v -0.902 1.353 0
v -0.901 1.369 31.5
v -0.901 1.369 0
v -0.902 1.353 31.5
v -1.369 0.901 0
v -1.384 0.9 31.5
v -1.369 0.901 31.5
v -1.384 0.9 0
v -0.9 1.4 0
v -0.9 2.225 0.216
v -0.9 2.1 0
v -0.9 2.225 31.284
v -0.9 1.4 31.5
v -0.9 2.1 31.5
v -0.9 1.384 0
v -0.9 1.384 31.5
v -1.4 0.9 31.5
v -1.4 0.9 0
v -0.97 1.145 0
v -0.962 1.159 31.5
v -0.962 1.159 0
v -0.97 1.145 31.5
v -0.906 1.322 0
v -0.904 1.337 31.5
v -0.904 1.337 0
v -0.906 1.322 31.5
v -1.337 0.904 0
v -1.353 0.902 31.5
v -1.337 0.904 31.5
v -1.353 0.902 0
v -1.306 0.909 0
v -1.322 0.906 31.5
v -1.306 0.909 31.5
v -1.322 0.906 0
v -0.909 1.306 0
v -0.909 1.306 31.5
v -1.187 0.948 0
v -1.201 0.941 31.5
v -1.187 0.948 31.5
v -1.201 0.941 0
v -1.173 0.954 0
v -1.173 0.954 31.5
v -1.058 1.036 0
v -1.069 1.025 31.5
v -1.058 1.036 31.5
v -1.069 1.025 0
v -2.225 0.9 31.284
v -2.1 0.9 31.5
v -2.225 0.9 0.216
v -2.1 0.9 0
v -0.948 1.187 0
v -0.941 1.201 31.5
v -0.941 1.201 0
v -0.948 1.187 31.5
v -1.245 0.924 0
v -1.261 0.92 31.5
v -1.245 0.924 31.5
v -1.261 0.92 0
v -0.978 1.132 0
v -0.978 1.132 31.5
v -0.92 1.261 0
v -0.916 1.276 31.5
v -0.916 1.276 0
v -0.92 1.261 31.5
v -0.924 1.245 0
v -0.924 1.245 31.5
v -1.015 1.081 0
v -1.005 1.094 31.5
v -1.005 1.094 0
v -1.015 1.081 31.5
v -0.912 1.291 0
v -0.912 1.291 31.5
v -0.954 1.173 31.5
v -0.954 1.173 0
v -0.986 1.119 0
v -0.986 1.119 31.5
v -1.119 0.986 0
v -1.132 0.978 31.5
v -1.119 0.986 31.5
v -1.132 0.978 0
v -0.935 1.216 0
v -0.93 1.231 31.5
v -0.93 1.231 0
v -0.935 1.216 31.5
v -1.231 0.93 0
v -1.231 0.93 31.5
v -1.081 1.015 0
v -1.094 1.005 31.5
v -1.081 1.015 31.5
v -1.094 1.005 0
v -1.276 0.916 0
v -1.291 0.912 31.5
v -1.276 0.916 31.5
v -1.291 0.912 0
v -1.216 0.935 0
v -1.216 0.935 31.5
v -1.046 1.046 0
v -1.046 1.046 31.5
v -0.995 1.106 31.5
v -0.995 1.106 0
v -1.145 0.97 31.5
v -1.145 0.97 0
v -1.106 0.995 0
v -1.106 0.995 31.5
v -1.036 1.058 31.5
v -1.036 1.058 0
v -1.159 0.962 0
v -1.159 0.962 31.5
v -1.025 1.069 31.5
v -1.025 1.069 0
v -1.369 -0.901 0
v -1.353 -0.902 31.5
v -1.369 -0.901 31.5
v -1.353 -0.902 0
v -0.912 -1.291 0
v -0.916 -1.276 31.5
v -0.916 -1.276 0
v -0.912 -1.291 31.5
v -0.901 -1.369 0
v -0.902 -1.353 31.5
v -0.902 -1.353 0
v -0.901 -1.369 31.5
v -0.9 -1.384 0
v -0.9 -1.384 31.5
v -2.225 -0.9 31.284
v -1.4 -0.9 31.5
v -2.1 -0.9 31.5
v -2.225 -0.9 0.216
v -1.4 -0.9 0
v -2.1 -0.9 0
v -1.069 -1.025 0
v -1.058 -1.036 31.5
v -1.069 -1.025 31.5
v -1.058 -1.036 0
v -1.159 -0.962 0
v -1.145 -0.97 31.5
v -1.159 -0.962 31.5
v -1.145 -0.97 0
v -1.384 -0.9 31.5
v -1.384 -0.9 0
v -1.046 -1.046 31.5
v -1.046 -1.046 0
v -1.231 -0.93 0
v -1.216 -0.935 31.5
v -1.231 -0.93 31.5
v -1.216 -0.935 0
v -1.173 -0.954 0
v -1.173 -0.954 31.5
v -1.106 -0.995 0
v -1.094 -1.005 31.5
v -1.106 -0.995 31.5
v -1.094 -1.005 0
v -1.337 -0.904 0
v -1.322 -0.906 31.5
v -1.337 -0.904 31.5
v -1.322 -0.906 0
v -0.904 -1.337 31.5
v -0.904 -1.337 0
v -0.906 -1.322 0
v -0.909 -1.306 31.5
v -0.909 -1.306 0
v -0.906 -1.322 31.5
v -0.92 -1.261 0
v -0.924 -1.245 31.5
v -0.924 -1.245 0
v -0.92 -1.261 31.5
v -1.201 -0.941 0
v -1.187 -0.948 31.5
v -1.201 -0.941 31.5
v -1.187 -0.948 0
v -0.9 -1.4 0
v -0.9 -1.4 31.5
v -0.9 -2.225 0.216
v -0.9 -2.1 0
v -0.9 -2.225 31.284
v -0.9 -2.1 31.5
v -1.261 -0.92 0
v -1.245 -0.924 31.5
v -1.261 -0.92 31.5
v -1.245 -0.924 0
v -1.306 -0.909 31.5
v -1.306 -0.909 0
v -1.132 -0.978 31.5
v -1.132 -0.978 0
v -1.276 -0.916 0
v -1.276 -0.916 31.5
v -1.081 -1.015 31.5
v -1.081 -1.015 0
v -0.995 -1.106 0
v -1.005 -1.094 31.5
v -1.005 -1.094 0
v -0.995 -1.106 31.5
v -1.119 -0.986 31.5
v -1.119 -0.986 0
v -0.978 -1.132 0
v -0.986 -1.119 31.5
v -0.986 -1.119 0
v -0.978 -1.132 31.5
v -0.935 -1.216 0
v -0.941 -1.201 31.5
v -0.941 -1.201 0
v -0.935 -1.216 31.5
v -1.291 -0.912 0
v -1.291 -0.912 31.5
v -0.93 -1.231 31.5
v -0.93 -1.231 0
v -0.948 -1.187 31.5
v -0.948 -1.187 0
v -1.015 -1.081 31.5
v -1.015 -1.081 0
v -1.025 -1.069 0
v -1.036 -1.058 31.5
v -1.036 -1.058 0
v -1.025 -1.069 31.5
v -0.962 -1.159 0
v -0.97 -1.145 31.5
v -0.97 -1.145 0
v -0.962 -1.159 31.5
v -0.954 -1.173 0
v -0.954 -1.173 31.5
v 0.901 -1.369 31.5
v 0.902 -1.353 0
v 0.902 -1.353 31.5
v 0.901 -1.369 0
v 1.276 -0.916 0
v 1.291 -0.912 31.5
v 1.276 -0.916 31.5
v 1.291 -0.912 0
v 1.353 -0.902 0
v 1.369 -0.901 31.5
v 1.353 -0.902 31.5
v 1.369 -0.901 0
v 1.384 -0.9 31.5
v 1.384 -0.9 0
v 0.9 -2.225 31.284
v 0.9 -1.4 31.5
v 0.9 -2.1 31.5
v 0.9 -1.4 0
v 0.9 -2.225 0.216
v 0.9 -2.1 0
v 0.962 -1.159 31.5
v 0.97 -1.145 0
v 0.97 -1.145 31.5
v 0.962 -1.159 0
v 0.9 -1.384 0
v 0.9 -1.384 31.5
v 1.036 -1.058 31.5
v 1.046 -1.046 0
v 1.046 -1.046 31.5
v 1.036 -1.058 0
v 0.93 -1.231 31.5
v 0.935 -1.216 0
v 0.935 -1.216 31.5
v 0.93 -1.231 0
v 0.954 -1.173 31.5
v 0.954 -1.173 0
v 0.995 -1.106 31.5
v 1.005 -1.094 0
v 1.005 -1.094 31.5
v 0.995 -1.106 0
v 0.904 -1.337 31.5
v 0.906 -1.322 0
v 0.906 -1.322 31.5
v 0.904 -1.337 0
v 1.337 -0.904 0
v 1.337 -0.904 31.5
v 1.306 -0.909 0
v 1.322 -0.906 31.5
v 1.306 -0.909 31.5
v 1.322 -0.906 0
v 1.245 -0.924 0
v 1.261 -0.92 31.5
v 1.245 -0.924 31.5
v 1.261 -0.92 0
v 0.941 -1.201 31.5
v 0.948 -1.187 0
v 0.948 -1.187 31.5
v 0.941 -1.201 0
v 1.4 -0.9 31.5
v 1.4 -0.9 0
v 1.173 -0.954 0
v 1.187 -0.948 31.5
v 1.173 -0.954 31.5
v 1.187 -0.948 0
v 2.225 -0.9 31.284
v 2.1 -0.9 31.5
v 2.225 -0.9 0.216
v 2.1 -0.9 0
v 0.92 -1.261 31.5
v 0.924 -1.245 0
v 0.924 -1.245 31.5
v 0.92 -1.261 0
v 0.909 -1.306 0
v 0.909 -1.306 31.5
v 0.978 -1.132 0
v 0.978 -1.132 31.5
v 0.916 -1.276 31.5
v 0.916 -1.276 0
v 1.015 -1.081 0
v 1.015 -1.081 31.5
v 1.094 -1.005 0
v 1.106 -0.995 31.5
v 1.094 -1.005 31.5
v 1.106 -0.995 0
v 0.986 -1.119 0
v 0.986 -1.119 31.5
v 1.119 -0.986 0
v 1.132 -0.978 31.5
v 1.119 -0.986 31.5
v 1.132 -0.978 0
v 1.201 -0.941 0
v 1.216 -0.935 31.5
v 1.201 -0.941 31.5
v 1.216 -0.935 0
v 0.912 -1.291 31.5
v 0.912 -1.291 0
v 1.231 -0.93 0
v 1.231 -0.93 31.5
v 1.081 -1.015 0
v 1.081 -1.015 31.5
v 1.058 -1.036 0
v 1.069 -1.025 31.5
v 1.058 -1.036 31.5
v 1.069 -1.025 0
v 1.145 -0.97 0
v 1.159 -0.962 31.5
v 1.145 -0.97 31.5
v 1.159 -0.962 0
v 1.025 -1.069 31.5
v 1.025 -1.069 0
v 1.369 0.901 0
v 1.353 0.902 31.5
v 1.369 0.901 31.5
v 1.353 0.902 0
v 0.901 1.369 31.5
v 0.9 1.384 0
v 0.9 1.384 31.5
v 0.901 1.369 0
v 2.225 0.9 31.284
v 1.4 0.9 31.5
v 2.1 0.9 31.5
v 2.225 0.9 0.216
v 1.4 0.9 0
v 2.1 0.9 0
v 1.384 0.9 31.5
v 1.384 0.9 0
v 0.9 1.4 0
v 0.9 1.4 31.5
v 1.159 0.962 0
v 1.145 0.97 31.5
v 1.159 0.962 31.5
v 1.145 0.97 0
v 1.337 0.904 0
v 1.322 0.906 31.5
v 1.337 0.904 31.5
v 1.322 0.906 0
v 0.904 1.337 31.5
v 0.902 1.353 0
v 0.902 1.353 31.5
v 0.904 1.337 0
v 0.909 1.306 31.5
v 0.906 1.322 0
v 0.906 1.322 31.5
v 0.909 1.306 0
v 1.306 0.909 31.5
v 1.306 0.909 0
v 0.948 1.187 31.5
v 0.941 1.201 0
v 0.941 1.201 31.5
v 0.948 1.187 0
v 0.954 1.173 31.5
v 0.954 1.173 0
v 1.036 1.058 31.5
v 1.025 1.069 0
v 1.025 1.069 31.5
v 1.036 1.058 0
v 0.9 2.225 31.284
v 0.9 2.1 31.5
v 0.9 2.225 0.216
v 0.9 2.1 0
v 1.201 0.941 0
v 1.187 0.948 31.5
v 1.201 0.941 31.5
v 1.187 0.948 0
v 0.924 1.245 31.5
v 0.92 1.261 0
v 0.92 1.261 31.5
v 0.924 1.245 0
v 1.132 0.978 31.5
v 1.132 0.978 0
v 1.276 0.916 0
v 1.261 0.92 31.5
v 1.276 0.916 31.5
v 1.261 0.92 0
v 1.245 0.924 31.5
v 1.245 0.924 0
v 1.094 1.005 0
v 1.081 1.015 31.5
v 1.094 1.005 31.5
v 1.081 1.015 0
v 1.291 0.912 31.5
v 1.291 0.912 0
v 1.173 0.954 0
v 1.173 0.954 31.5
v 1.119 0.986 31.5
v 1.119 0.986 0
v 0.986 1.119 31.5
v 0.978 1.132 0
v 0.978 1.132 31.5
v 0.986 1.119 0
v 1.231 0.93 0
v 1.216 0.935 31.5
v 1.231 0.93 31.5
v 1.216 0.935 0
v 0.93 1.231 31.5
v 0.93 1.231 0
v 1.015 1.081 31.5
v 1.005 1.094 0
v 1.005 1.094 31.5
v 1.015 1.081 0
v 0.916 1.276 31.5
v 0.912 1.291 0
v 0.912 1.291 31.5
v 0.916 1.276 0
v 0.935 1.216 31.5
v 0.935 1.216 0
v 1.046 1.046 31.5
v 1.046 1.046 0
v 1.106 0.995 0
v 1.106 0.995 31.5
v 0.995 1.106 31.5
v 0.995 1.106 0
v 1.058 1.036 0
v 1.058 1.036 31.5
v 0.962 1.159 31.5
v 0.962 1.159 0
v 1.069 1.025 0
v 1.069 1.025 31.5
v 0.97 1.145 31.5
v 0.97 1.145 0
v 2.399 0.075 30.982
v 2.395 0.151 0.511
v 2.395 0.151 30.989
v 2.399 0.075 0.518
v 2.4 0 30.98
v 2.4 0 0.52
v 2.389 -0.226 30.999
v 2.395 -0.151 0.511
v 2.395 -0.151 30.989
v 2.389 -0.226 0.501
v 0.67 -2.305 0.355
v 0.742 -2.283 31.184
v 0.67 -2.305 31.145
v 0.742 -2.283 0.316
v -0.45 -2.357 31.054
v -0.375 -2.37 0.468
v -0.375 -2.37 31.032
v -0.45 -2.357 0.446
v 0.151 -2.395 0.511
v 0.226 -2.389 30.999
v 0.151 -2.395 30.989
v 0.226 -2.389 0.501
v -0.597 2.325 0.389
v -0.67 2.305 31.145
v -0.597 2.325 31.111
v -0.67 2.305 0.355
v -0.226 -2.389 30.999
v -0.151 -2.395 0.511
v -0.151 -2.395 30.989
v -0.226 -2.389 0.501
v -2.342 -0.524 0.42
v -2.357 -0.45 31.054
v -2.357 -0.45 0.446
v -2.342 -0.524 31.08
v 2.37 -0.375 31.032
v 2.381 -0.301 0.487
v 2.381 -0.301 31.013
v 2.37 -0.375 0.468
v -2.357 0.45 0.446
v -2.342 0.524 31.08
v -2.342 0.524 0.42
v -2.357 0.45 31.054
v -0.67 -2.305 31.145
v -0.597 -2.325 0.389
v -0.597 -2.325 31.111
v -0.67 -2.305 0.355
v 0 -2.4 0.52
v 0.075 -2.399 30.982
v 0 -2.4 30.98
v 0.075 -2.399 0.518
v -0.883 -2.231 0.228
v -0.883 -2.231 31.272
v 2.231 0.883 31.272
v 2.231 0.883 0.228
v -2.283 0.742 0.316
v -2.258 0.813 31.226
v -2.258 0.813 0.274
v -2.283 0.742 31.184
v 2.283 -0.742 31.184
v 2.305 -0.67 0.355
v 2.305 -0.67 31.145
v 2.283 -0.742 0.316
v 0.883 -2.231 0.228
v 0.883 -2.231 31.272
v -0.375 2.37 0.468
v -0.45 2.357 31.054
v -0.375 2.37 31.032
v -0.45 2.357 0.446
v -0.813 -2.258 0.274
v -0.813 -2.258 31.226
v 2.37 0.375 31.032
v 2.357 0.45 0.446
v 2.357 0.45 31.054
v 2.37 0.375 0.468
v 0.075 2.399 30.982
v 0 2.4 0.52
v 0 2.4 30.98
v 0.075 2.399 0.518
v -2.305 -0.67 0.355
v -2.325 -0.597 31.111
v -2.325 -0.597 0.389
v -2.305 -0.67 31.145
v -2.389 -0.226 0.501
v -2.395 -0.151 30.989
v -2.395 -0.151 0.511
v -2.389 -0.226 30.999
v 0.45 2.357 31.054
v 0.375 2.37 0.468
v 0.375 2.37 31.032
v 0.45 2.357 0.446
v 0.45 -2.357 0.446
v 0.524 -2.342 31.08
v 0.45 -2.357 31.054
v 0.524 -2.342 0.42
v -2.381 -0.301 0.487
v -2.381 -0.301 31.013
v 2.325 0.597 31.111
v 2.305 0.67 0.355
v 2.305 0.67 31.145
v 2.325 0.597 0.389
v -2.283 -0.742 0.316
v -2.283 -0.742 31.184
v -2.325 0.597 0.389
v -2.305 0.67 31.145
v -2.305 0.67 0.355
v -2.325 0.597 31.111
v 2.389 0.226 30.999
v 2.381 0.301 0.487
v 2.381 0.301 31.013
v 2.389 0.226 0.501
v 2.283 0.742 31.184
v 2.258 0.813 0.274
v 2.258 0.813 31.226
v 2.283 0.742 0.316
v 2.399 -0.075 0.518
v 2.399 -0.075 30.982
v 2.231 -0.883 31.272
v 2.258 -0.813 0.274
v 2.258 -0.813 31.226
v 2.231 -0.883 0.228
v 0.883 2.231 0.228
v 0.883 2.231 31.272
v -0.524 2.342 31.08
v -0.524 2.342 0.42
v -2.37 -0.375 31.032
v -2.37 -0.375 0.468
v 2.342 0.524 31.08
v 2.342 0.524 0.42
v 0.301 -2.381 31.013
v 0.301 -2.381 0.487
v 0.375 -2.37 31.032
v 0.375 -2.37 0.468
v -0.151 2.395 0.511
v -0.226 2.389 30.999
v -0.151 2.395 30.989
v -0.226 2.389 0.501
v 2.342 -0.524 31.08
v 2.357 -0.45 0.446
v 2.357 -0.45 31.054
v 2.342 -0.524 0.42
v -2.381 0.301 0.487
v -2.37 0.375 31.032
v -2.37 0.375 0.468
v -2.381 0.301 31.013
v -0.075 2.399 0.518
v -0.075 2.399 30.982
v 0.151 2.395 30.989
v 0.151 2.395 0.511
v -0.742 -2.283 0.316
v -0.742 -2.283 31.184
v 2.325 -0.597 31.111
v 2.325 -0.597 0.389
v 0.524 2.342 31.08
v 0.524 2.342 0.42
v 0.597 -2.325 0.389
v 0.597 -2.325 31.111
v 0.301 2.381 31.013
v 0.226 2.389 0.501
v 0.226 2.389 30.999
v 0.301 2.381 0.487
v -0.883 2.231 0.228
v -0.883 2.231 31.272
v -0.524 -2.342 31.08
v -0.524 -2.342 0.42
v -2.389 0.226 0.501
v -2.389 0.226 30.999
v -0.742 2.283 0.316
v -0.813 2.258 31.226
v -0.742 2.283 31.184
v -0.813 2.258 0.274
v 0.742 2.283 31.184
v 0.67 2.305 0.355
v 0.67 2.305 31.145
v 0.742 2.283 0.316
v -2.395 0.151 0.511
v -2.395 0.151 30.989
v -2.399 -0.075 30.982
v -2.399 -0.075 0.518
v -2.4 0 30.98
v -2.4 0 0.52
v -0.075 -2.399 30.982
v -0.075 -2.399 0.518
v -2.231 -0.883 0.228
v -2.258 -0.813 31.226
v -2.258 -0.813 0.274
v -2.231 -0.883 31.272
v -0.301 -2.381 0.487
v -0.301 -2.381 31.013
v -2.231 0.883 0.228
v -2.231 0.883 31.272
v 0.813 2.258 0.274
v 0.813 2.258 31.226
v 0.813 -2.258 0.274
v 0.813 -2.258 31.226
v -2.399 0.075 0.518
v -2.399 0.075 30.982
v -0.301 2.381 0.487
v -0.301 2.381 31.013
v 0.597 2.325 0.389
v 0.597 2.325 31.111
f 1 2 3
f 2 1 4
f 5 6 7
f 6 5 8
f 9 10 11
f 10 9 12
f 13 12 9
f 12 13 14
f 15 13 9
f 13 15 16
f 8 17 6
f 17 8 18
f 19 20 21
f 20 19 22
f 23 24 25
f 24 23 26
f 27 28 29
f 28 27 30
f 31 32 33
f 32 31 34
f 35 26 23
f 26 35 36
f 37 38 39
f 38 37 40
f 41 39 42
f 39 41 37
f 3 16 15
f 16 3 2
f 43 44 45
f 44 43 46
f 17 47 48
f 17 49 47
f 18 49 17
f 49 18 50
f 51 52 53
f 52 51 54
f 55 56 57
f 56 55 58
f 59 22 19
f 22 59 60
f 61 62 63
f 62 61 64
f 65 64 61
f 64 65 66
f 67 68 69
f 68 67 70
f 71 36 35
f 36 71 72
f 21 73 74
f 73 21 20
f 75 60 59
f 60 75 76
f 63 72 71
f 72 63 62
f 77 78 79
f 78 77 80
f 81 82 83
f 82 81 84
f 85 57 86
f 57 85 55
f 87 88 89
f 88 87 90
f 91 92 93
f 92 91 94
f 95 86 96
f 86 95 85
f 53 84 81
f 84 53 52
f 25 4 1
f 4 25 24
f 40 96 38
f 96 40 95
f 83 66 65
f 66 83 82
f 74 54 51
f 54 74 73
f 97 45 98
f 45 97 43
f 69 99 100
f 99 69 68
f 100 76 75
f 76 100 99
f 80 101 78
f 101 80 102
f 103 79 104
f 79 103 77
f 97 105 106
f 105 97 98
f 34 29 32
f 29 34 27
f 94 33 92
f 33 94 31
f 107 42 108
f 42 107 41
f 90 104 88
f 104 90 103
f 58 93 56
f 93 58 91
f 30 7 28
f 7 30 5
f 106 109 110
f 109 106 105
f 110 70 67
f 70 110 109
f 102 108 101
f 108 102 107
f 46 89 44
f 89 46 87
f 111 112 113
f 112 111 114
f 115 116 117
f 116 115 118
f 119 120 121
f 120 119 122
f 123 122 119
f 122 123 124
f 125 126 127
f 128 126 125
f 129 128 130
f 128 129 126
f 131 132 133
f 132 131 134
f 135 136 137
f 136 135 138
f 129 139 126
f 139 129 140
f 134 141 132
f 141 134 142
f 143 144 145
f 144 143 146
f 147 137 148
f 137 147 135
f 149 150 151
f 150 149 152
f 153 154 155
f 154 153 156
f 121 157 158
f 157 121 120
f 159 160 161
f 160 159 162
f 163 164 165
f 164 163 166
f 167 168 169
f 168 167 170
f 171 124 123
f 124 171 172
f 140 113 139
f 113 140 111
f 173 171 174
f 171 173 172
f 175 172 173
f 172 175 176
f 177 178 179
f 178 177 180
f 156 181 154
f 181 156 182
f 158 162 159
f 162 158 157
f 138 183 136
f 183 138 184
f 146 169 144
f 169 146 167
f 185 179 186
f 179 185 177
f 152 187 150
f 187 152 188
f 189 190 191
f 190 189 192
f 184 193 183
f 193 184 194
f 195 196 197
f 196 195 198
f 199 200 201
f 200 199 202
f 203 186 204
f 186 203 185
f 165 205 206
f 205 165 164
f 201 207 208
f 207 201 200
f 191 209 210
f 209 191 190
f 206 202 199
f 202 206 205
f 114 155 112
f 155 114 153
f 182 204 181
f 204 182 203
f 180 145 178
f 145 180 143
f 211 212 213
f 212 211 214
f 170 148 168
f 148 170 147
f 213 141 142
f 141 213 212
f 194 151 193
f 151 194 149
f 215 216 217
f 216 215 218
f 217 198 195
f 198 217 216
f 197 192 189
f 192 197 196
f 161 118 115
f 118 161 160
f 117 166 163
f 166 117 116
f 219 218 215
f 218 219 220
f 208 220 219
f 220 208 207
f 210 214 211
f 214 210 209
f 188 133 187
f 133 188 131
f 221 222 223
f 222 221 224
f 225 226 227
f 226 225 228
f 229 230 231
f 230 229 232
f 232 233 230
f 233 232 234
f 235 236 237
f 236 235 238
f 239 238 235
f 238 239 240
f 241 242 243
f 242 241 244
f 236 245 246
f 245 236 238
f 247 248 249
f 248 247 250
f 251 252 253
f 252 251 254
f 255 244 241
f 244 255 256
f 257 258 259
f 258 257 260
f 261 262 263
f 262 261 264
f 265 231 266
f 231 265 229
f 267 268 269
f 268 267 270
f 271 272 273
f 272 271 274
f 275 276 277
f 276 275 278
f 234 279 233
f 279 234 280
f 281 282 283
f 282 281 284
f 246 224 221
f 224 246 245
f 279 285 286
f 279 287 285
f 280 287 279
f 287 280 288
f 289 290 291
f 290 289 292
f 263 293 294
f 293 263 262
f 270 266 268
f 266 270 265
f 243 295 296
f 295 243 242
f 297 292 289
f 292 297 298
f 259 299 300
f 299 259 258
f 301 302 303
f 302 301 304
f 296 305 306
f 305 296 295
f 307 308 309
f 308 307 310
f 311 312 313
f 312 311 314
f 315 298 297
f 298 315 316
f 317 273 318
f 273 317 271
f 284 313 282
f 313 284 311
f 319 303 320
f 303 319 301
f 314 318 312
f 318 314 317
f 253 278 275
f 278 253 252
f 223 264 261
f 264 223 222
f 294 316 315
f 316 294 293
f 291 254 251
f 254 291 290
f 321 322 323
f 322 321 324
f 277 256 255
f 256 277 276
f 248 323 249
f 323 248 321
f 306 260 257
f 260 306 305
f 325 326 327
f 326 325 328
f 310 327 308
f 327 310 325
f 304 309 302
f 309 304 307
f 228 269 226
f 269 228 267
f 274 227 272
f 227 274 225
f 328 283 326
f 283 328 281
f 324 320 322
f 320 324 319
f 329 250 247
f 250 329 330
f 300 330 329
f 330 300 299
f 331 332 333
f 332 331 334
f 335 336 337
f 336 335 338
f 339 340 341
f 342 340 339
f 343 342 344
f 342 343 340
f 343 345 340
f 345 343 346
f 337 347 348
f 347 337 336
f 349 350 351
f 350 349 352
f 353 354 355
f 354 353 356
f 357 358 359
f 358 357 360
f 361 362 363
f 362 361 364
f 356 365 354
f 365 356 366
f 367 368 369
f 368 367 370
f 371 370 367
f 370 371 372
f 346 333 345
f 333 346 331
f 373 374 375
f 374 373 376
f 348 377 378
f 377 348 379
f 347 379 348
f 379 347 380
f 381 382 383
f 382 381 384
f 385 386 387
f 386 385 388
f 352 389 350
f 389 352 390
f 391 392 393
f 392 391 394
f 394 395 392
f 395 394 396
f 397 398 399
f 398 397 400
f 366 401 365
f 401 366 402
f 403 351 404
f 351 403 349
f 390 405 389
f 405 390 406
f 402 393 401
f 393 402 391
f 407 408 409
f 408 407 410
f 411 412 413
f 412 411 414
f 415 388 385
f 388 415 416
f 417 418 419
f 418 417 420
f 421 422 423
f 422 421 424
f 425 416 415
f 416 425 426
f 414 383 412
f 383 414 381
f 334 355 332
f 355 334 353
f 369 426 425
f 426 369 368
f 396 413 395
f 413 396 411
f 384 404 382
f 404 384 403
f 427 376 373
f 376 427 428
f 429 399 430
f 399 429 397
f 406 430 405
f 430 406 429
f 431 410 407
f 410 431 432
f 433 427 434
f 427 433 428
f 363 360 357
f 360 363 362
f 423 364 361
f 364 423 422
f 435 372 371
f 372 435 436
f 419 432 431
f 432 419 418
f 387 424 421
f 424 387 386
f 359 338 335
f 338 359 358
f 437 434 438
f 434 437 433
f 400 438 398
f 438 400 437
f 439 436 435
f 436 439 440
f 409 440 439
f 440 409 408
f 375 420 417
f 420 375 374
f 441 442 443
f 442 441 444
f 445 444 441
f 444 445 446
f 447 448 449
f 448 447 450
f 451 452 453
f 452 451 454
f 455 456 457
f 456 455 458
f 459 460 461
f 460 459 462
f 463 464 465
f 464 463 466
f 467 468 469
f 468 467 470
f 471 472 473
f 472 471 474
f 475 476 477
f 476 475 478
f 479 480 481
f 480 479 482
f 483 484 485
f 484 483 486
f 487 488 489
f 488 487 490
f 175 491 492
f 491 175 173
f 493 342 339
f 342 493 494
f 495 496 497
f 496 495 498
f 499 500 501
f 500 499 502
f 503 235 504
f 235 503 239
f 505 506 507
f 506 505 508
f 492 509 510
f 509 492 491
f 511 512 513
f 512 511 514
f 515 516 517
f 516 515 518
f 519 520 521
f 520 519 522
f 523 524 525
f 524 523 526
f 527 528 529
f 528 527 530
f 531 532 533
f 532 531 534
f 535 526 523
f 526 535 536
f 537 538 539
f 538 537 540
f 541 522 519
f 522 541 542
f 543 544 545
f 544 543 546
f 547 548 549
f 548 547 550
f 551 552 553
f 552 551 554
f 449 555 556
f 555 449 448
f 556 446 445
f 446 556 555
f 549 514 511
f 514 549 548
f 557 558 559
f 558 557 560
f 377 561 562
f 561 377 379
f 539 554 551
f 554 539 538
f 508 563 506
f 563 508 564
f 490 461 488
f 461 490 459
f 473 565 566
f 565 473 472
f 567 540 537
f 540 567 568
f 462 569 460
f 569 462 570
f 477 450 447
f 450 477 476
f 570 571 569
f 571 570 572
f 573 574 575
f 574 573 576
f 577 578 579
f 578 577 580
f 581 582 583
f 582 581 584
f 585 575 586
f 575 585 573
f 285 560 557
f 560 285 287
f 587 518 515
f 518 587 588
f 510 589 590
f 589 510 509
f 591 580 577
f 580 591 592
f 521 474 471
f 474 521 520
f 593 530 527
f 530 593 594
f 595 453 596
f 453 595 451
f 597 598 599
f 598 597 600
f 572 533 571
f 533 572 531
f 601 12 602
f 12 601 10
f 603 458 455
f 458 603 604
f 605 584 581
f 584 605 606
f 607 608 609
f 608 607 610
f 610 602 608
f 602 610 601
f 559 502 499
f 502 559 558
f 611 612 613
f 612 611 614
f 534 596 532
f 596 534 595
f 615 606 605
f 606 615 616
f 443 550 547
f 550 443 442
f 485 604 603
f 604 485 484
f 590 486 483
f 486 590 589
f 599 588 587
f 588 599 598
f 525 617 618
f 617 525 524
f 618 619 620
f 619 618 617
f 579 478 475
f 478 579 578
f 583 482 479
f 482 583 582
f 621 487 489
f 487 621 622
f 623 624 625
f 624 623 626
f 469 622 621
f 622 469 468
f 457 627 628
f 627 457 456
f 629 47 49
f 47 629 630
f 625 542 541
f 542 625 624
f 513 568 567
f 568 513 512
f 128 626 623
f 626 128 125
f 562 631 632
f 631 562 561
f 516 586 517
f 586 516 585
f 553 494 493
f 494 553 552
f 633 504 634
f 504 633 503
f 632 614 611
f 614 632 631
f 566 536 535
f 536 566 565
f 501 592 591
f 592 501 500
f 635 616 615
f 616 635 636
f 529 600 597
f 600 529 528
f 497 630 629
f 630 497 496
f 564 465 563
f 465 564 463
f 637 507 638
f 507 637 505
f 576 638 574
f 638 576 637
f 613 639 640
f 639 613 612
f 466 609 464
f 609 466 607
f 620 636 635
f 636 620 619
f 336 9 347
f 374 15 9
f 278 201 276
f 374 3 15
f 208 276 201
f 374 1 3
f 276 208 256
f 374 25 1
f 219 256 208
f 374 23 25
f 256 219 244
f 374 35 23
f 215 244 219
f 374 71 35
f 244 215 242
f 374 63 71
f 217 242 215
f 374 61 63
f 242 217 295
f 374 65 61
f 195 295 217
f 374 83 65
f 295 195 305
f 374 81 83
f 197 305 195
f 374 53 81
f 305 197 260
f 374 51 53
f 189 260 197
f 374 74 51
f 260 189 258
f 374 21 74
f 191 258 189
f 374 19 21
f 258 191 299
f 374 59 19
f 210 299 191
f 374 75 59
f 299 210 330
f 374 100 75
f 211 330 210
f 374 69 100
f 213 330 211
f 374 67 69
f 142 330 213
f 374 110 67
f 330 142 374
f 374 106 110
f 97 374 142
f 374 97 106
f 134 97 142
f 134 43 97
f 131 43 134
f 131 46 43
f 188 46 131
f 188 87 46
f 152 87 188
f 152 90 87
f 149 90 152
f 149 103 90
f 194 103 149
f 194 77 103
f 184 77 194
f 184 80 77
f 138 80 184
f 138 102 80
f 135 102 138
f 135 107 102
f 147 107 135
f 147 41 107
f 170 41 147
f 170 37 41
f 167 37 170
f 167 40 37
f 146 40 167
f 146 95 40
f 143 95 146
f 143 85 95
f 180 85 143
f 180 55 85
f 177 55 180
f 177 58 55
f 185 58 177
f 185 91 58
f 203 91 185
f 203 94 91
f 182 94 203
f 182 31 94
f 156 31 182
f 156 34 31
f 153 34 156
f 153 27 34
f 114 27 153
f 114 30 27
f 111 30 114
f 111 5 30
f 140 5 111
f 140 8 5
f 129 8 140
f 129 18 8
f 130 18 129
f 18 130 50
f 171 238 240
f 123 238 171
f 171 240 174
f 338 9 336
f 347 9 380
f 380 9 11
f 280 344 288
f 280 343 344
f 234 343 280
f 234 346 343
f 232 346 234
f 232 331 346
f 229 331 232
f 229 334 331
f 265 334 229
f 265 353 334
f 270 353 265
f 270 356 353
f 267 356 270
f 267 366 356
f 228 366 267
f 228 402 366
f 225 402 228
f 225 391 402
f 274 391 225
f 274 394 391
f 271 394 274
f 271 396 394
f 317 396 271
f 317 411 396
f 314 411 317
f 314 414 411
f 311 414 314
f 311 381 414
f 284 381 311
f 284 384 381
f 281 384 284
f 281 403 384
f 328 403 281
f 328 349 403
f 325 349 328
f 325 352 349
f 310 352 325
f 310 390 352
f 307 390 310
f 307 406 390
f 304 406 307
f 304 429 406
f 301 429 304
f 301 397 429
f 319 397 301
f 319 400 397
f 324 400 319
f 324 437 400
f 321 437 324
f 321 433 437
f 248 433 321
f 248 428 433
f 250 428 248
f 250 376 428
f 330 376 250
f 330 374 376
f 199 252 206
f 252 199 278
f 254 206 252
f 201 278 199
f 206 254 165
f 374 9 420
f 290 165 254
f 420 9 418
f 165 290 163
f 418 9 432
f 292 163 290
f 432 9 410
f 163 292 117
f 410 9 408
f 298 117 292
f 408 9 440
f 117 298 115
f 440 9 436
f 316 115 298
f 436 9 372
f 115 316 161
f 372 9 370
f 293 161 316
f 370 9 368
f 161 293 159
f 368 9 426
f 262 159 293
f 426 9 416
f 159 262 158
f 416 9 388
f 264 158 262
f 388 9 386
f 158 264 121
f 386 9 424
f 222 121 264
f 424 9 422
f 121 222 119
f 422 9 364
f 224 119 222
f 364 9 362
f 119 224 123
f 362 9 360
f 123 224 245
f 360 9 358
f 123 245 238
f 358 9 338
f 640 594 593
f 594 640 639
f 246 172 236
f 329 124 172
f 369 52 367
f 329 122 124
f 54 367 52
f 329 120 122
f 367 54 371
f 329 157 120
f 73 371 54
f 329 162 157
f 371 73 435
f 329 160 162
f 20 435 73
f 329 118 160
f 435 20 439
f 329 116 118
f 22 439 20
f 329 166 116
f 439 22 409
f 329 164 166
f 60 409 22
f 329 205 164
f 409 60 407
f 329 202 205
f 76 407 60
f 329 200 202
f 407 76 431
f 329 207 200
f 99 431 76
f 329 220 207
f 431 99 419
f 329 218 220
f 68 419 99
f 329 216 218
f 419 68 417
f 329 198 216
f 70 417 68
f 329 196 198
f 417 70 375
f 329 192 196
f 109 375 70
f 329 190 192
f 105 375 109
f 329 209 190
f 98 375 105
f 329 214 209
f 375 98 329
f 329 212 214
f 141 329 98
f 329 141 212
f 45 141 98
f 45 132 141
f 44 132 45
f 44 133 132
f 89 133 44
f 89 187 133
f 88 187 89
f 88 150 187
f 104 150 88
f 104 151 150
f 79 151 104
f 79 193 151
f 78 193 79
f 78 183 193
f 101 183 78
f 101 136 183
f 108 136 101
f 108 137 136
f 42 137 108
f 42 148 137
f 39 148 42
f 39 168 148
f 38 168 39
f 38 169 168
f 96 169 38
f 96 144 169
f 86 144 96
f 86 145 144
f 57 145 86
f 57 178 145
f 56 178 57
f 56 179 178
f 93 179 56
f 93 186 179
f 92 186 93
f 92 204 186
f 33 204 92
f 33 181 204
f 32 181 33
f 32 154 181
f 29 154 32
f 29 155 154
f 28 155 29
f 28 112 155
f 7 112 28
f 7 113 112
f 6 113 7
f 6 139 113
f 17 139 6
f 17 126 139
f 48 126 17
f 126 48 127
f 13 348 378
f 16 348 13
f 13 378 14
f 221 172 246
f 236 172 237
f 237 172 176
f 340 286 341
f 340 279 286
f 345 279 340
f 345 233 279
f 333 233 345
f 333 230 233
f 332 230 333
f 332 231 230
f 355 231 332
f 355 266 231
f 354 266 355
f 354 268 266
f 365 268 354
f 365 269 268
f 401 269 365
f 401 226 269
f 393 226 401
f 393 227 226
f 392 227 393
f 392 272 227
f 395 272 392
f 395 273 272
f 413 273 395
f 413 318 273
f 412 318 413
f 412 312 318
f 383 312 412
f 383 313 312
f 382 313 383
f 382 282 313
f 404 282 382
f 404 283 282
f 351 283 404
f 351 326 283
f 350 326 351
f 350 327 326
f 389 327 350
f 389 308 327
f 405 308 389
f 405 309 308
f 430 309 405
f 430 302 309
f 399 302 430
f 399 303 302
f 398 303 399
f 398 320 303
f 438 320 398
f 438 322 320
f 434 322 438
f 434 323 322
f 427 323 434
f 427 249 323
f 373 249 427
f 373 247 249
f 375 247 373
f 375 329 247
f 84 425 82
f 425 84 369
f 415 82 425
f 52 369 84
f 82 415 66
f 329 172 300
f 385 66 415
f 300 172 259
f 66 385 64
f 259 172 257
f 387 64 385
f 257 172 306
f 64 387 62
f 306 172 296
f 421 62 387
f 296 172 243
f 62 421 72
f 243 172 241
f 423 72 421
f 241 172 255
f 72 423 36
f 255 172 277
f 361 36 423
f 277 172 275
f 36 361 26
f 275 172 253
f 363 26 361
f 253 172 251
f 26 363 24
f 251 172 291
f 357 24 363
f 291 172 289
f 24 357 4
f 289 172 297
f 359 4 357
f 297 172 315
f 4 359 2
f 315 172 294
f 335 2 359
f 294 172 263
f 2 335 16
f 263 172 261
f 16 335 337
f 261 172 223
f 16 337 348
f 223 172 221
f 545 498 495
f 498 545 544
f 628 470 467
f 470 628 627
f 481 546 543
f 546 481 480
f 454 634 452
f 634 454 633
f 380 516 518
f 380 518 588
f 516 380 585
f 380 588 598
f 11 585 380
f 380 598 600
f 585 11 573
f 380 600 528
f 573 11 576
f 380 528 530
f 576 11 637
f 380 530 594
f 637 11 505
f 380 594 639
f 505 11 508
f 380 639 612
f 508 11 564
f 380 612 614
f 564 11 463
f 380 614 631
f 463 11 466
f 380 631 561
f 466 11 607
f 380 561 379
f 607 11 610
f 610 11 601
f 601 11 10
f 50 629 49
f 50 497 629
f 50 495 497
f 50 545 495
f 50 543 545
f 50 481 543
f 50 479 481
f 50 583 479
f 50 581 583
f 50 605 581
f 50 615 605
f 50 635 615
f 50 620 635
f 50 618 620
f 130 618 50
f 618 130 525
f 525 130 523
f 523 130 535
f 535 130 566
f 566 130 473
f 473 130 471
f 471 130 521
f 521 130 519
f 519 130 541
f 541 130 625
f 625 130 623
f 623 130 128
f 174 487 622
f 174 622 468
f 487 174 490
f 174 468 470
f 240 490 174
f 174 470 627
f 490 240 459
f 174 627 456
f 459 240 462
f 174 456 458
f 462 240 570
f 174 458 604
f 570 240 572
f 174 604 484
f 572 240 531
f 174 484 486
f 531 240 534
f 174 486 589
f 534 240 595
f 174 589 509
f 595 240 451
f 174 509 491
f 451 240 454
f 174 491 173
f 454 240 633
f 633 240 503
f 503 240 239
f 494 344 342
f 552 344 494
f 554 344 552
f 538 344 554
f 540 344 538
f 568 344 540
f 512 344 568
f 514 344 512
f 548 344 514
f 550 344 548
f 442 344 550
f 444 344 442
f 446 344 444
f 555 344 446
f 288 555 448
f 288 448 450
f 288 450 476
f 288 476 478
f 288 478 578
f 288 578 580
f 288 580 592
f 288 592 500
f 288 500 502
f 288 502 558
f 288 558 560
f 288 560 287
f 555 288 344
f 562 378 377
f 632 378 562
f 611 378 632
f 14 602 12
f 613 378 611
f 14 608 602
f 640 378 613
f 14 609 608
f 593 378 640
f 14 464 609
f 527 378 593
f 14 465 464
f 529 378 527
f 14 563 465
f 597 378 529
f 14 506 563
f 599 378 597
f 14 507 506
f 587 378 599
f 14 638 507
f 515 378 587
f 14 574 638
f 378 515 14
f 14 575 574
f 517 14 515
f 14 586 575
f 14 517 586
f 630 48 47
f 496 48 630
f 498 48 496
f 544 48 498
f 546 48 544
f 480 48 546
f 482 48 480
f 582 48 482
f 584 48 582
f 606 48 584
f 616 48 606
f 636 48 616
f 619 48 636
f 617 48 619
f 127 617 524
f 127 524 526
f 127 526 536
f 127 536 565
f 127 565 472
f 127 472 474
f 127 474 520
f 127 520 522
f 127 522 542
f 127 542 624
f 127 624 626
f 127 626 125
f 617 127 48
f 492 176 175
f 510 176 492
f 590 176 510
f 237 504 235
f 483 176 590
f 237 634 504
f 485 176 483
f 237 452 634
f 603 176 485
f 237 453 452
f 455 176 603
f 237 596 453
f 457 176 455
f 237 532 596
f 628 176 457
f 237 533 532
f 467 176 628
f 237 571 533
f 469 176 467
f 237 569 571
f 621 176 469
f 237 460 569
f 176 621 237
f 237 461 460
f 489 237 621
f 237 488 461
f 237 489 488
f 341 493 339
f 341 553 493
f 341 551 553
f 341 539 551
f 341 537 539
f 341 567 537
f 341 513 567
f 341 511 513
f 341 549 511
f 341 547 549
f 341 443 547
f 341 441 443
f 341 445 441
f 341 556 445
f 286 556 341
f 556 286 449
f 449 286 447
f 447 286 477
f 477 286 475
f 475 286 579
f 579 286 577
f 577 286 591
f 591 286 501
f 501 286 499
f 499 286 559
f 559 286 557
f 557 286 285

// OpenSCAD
eps = 0.001;

modelScale = 1.0;


nrOfUnits = 4;
addScrewHole = false;
rScrewHole = 3.0/2/2.5;


// printability corrections; values should be zero for real object dimensions 
PRINTABLE = 0;
correction_r1 = PRINTABLE ? 0.1 : 0.0;
correction_r2 = PRINTABLE ? 0.1 : 0.0;




// axle
r1 = (4.8/2 + correction_r1)*modelScale;
r2 = (1.0/2 + correction_r2)*modelScale;
offset_r2 = 1.4*modelScale;

axleBaseLength = -0.5*modelScale;
axleLengthUnit = 8.0*modelScale;


// camfer
camferAngle = 60;
camferWidth = 0.3;



module drawCamferSingle()
{
    smallSize = 4*r1;
    translate([0,r1-camferWidth,0]) rotate([camferAngle,0,0]) translate([-smallSize/2,-smallSize/2,-smallSize]) cube([smallSize,smallSize,smallSize]);
}


module drawCamfer()
{
    drawCamferSingle();
    rotate([0,0,90]) drawCamferSingle();
    rotate([0,0,180]) drawCamferSingle();
    rotate([0,0,270]) drawCamferSingle();
}


module drawAxleCutOut(prmLength)
{
    smallSize = 6*r2;   
    translate([-offset_r2,offset_r2,0]) hull()
    {
        translate([0,0,-eps]) cylinder(prmLength+2*eps,r2,r2,$fn=200*modelScale);
        translate([-smallSize,-r2,-eps]) cube([eps,2*r2,prmLength+2*eps]);
        translate([-r2,smallSize,-eps]) cube([2*r2,eps,prmLength+2*eps]);
    }
}    


module drawAxleEx(prmLength)
{	
    echo("prmLength",prmLength);
	difference()
	{
		union()
		{
			cylinder(prmLength,r1,r1,$fn=200*modelScale);
		}
		union()
		{
            drawAxleCutOut(prmLength);
            rotate([0,0,90]) drawAxleCutOut(prmLength);
            rotate([0,0,180]) drawAxleCutOut(prmLength);
            rotate([0,0,270]) drawAxleCutOut(prmLength);
		}
	}
}


module drawAxle()
{
    length = axleBaseLength+nrOfUnits*axleLengthUnit;
    difference()
	{
        union()
        {
            drawAxleEx(length);
        }
        union()
        {
            if (addScrewHole)
            {
                translate([0,0,-2*eps]) cylinder(length+4*eps,rScrewHole,rScrewHole,$fn=50*modelScale);
            }
            drawCamfer();
            translate([0,0,length]) mirror([0,0,1]) drawCamfer();
        }
    }
}


// tests
//drawCamfer();
//drawAxleCutOut(2);


// parts
drawAxle();
